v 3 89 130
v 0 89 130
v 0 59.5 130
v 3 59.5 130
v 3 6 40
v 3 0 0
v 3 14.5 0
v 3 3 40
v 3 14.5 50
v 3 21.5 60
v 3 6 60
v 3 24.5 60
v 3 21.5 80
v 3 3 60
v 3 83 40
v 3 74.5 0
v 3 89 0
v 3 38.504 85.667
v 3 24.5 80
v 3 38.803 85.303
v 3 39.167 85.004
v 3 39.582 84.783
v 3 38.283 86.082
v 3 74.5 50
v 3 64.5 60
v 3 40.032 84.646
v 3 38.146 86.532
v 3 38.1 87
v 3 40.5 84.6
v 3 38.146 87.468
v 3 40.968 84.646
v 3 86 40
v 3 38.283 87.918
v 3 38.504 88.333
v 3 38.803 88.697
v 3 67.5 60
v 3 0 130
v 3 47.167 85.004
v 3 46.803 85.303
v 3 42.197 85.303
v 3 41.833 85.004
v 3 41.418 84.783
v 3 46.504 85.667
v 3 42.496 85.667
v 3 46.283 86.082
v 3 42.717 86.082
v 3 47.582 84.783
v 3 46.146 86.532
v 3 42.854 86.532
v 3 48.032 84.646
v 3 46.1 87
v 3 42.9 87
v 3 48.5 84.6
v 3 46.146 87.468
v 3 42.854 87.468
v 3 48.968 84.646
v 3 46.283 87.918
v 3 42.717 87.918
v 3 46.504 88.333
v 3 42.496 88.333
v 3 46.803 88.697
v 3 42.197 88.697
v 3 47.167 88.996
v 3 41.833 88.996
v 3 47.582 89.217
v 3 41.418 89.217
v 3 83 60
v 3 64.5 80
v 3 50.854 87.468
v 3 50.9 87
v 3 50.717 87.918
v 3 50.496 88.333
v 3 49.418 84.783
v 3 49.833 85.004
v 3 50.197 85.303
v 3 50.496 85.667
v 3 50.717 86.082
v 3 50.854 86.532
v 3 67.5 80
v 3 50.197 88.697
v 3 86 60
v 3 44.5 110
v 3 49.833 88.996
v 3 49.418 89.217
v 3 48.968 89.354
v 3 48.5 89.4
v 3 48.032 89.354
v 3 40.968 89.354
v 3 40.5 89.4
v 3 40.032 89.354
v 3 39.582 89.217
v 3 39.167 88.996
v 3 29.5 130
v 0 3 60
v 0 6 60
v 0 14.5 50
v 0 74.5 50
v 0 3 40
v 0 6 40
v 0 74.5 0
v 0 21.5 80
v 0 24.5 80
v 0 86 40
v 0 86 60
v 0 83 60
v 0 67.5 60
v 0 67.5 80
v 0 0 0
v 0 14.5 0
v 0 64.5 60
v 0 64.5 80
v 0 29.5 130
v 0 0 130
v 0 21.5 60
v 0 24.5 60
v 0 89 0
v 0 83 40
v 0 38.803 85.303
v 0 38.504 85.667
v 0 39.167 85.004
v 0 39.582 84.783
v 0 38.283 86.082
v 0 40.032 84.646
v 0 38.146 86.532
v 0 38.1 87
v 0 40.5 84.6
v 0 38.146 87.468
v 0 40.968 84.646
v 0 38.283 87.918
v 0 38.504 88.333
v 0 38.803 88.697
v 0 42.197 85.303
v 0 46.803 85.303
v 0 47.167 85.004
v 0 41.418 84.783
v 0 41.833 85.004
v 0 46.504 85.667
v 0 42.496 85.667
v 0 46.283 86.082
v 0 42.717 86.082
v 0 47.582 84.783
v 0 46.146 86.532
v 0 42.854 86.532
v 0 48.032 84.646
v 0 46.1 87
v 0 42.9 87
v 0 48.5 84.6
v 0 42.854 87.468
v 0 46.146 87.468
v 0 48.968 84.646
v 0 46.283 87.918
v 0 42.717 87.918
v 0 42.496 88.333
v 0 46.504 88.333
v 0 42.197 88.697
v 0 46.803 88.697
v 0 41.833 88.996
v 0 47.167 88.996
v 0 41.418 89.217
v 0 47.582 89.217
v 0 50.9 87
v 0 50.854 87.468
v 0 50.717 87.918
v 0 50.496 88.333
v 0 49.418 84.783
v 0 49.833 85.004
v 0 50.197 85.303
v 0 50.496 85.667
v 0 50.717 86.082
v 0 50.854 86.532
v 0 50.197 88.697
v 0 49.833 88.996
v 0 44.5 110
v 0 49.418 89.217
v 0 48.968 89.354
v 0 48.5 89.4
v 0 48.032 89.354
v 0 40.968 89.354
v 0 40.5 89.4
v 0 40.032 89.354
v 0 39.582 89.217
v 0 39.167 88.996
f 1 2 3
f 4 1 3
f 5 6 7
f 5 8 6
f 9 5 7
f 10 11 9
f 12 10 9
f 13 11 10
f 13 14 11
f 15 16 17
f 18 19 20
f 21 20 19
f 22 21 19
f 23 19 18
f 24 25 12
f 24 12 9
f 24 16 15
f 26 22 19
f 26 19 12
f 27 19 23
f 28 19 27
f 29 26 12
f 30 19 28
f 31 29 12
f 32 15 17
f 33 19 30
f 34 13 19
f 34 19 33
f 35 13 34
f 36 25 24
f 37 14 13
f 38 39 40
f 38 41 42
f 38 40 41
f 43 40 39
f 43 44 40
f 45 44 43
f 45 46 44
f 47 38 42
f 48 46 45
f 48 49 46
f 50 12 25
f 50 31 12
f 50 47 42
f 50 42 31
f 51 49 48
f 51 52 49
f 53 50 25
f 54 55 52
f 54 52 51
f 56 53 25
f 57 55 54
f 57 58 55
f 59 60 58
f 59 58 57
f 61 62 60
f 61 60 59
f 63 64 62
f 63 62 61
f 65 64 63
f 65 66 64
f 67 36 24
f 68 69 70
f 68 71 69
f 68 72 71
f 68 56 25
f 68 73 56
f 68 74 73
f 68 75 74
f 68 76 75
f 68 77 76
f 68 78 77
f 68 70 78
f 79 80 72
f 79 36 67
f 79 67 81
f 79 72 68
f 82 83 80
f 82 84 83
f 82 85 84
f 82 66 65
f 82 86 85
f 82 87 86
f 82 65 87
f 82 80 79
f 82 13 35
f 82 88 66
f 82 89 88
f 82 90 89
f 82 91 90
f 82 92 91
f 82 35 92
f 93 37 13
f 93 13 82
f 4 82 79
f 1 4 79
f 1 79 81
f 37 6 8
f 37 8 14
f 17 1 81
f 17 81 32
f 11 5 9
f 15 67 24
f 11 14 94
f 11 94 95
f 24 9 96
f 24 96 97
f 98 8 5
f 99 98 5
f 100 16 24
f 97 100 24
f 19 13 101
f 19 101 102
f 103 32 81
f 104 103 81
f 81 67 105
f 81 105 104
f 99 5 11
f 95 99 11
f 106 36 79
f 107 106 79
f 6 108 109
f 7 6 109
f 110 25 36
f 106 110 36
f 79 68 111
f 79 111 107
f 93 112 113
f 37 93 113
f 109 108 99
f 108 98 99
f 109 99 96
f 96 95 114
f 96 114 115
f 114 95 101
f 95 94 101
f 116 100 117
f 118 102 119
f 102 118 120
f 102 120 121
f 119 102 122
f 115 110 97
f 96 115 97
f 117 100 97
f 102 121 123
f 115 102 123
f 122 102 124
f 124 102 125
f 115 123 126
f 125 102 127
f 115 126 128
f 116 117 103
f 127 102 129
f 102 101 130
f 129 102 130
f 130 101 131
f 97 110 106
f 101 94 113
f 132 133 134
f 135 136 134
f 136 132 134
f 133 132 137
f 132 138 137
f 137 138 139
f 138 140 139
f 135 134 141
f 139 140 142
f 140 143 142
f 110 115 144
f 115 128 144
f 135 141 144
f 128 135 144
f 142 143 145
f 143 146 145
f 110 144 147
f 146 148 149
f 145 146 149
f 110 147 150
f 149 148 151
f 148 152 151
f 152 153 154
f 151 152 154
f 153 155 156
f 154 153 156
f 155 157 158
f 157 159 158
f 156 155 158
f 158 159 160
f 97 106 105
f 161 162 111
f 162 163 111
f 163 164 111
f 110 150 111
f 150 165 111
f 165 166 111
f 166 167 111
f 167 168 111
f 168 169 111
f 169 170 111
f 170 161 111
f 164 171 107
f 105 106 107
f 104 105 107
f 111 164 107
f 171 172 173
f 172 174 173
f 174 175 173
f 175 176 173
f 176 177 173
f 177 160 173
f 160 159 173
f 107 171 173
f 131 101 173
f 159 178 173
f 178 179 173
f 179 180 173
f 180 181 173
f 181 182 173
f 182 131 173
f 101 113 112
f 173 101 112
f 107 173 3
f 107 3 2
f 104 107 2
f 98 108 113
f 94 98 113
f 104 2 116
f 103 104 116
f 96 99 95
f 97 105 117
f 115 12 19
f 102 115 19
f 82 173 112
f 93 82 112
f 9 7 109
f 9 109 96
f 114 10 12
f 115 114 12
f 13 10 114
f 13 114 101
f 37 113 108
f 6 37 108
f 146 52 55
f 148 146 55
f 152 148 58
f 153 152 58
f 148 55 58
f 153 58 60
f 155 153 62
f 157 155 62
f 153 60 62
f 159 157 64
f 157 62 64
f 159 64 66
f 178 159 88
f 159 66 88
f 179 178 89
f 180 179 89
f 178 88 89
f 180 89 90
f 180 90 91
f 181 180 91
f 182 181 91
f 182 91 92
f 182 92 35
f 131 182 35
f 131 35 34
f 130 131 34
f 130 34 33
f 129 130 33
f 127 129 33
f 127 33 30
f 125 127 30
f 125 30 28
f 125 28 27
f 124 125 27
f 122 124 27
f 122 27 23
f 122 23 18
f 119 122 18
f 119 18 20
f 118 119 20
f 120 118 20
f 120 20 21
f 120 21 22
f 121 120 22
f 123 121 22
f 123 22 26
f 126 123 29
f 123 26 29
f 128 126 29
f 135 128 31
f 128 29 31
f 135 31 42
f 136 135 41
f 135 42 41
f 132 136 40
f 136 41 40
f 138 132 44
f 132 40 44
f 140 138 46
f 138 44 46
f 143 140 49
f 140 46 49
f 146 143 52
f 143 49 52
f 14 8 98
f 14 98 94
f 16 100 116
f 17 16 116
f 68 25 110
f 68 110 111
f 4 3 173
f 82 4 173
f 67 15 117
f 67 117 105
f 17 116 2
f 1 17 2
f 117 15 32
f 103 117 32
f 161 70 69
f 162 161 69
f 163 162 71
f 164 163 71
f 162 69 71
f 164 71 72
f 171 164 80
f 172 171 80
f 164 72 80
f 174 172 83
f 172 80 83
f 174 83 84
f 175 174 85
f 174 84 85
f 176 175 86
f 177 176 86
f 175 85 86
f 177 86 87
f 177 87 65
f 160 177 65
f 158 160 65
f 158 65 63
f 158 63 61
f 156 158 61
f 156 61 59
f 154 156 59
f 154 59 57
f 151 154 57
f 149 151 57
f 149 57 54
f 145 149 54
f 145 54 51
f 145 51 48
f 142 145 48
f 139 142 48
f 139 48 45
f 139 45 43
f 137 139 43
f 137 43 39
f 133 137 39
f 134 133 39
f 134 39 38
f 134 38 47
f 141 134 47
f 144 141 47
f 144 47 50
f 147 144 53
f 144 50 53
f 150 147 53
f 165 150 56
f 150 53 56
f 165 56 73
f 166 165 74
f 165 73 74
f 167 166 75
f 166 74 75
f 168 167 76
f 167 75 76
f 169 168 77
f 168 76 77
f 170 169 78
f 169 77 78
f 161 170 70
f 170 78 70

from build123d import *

# Parameters (mm, degrees)
F1_DEPTH = 3
F2_W     = 3
F2_H     = 20
F2_R     = 2.4
F2_W_2   = 60
F2_H_2   = 50
F3_DEPTH = 25


with BuildPart() as f1:
    # F0 (on Right) → F1 (new body)
    with BuildSketch(Plane.YZ):
        Polygon((29.5, 130), (0, 130), (0, 0), (89, 0), (89, 130), (59.5, 130), (44.5, 110), align=None)
    extrude(amount=F1_DEPTH)

    # F2 (on face) → F3 (cut)
    with BuildSketch(Plane.YZ.offset(3)):
        with Locations((4.5, 50)):
            Rectangle(F2_W, F2_H)
        with Locations((84.5, 50)):
            Rectangle(F2_W, F2_H)
        with Locations((40.5, 87)):
            Circle(F2_R)
        with Locations((48.5, 87)):
            Circle(F2_R)
        with Locations((23, 70)):
            Rectangle(F2_W, F2_H)
        with Locations((66, 70)):
            Rectangle(F2_W, F2_H)
        with Locations((44.5, 25)):
            Rectangle(F2_W_2, F2_H_2)
    extrude(amount=-F3_DEPTH, mode=Mode.SUBTRACT)


solid = f1.part
